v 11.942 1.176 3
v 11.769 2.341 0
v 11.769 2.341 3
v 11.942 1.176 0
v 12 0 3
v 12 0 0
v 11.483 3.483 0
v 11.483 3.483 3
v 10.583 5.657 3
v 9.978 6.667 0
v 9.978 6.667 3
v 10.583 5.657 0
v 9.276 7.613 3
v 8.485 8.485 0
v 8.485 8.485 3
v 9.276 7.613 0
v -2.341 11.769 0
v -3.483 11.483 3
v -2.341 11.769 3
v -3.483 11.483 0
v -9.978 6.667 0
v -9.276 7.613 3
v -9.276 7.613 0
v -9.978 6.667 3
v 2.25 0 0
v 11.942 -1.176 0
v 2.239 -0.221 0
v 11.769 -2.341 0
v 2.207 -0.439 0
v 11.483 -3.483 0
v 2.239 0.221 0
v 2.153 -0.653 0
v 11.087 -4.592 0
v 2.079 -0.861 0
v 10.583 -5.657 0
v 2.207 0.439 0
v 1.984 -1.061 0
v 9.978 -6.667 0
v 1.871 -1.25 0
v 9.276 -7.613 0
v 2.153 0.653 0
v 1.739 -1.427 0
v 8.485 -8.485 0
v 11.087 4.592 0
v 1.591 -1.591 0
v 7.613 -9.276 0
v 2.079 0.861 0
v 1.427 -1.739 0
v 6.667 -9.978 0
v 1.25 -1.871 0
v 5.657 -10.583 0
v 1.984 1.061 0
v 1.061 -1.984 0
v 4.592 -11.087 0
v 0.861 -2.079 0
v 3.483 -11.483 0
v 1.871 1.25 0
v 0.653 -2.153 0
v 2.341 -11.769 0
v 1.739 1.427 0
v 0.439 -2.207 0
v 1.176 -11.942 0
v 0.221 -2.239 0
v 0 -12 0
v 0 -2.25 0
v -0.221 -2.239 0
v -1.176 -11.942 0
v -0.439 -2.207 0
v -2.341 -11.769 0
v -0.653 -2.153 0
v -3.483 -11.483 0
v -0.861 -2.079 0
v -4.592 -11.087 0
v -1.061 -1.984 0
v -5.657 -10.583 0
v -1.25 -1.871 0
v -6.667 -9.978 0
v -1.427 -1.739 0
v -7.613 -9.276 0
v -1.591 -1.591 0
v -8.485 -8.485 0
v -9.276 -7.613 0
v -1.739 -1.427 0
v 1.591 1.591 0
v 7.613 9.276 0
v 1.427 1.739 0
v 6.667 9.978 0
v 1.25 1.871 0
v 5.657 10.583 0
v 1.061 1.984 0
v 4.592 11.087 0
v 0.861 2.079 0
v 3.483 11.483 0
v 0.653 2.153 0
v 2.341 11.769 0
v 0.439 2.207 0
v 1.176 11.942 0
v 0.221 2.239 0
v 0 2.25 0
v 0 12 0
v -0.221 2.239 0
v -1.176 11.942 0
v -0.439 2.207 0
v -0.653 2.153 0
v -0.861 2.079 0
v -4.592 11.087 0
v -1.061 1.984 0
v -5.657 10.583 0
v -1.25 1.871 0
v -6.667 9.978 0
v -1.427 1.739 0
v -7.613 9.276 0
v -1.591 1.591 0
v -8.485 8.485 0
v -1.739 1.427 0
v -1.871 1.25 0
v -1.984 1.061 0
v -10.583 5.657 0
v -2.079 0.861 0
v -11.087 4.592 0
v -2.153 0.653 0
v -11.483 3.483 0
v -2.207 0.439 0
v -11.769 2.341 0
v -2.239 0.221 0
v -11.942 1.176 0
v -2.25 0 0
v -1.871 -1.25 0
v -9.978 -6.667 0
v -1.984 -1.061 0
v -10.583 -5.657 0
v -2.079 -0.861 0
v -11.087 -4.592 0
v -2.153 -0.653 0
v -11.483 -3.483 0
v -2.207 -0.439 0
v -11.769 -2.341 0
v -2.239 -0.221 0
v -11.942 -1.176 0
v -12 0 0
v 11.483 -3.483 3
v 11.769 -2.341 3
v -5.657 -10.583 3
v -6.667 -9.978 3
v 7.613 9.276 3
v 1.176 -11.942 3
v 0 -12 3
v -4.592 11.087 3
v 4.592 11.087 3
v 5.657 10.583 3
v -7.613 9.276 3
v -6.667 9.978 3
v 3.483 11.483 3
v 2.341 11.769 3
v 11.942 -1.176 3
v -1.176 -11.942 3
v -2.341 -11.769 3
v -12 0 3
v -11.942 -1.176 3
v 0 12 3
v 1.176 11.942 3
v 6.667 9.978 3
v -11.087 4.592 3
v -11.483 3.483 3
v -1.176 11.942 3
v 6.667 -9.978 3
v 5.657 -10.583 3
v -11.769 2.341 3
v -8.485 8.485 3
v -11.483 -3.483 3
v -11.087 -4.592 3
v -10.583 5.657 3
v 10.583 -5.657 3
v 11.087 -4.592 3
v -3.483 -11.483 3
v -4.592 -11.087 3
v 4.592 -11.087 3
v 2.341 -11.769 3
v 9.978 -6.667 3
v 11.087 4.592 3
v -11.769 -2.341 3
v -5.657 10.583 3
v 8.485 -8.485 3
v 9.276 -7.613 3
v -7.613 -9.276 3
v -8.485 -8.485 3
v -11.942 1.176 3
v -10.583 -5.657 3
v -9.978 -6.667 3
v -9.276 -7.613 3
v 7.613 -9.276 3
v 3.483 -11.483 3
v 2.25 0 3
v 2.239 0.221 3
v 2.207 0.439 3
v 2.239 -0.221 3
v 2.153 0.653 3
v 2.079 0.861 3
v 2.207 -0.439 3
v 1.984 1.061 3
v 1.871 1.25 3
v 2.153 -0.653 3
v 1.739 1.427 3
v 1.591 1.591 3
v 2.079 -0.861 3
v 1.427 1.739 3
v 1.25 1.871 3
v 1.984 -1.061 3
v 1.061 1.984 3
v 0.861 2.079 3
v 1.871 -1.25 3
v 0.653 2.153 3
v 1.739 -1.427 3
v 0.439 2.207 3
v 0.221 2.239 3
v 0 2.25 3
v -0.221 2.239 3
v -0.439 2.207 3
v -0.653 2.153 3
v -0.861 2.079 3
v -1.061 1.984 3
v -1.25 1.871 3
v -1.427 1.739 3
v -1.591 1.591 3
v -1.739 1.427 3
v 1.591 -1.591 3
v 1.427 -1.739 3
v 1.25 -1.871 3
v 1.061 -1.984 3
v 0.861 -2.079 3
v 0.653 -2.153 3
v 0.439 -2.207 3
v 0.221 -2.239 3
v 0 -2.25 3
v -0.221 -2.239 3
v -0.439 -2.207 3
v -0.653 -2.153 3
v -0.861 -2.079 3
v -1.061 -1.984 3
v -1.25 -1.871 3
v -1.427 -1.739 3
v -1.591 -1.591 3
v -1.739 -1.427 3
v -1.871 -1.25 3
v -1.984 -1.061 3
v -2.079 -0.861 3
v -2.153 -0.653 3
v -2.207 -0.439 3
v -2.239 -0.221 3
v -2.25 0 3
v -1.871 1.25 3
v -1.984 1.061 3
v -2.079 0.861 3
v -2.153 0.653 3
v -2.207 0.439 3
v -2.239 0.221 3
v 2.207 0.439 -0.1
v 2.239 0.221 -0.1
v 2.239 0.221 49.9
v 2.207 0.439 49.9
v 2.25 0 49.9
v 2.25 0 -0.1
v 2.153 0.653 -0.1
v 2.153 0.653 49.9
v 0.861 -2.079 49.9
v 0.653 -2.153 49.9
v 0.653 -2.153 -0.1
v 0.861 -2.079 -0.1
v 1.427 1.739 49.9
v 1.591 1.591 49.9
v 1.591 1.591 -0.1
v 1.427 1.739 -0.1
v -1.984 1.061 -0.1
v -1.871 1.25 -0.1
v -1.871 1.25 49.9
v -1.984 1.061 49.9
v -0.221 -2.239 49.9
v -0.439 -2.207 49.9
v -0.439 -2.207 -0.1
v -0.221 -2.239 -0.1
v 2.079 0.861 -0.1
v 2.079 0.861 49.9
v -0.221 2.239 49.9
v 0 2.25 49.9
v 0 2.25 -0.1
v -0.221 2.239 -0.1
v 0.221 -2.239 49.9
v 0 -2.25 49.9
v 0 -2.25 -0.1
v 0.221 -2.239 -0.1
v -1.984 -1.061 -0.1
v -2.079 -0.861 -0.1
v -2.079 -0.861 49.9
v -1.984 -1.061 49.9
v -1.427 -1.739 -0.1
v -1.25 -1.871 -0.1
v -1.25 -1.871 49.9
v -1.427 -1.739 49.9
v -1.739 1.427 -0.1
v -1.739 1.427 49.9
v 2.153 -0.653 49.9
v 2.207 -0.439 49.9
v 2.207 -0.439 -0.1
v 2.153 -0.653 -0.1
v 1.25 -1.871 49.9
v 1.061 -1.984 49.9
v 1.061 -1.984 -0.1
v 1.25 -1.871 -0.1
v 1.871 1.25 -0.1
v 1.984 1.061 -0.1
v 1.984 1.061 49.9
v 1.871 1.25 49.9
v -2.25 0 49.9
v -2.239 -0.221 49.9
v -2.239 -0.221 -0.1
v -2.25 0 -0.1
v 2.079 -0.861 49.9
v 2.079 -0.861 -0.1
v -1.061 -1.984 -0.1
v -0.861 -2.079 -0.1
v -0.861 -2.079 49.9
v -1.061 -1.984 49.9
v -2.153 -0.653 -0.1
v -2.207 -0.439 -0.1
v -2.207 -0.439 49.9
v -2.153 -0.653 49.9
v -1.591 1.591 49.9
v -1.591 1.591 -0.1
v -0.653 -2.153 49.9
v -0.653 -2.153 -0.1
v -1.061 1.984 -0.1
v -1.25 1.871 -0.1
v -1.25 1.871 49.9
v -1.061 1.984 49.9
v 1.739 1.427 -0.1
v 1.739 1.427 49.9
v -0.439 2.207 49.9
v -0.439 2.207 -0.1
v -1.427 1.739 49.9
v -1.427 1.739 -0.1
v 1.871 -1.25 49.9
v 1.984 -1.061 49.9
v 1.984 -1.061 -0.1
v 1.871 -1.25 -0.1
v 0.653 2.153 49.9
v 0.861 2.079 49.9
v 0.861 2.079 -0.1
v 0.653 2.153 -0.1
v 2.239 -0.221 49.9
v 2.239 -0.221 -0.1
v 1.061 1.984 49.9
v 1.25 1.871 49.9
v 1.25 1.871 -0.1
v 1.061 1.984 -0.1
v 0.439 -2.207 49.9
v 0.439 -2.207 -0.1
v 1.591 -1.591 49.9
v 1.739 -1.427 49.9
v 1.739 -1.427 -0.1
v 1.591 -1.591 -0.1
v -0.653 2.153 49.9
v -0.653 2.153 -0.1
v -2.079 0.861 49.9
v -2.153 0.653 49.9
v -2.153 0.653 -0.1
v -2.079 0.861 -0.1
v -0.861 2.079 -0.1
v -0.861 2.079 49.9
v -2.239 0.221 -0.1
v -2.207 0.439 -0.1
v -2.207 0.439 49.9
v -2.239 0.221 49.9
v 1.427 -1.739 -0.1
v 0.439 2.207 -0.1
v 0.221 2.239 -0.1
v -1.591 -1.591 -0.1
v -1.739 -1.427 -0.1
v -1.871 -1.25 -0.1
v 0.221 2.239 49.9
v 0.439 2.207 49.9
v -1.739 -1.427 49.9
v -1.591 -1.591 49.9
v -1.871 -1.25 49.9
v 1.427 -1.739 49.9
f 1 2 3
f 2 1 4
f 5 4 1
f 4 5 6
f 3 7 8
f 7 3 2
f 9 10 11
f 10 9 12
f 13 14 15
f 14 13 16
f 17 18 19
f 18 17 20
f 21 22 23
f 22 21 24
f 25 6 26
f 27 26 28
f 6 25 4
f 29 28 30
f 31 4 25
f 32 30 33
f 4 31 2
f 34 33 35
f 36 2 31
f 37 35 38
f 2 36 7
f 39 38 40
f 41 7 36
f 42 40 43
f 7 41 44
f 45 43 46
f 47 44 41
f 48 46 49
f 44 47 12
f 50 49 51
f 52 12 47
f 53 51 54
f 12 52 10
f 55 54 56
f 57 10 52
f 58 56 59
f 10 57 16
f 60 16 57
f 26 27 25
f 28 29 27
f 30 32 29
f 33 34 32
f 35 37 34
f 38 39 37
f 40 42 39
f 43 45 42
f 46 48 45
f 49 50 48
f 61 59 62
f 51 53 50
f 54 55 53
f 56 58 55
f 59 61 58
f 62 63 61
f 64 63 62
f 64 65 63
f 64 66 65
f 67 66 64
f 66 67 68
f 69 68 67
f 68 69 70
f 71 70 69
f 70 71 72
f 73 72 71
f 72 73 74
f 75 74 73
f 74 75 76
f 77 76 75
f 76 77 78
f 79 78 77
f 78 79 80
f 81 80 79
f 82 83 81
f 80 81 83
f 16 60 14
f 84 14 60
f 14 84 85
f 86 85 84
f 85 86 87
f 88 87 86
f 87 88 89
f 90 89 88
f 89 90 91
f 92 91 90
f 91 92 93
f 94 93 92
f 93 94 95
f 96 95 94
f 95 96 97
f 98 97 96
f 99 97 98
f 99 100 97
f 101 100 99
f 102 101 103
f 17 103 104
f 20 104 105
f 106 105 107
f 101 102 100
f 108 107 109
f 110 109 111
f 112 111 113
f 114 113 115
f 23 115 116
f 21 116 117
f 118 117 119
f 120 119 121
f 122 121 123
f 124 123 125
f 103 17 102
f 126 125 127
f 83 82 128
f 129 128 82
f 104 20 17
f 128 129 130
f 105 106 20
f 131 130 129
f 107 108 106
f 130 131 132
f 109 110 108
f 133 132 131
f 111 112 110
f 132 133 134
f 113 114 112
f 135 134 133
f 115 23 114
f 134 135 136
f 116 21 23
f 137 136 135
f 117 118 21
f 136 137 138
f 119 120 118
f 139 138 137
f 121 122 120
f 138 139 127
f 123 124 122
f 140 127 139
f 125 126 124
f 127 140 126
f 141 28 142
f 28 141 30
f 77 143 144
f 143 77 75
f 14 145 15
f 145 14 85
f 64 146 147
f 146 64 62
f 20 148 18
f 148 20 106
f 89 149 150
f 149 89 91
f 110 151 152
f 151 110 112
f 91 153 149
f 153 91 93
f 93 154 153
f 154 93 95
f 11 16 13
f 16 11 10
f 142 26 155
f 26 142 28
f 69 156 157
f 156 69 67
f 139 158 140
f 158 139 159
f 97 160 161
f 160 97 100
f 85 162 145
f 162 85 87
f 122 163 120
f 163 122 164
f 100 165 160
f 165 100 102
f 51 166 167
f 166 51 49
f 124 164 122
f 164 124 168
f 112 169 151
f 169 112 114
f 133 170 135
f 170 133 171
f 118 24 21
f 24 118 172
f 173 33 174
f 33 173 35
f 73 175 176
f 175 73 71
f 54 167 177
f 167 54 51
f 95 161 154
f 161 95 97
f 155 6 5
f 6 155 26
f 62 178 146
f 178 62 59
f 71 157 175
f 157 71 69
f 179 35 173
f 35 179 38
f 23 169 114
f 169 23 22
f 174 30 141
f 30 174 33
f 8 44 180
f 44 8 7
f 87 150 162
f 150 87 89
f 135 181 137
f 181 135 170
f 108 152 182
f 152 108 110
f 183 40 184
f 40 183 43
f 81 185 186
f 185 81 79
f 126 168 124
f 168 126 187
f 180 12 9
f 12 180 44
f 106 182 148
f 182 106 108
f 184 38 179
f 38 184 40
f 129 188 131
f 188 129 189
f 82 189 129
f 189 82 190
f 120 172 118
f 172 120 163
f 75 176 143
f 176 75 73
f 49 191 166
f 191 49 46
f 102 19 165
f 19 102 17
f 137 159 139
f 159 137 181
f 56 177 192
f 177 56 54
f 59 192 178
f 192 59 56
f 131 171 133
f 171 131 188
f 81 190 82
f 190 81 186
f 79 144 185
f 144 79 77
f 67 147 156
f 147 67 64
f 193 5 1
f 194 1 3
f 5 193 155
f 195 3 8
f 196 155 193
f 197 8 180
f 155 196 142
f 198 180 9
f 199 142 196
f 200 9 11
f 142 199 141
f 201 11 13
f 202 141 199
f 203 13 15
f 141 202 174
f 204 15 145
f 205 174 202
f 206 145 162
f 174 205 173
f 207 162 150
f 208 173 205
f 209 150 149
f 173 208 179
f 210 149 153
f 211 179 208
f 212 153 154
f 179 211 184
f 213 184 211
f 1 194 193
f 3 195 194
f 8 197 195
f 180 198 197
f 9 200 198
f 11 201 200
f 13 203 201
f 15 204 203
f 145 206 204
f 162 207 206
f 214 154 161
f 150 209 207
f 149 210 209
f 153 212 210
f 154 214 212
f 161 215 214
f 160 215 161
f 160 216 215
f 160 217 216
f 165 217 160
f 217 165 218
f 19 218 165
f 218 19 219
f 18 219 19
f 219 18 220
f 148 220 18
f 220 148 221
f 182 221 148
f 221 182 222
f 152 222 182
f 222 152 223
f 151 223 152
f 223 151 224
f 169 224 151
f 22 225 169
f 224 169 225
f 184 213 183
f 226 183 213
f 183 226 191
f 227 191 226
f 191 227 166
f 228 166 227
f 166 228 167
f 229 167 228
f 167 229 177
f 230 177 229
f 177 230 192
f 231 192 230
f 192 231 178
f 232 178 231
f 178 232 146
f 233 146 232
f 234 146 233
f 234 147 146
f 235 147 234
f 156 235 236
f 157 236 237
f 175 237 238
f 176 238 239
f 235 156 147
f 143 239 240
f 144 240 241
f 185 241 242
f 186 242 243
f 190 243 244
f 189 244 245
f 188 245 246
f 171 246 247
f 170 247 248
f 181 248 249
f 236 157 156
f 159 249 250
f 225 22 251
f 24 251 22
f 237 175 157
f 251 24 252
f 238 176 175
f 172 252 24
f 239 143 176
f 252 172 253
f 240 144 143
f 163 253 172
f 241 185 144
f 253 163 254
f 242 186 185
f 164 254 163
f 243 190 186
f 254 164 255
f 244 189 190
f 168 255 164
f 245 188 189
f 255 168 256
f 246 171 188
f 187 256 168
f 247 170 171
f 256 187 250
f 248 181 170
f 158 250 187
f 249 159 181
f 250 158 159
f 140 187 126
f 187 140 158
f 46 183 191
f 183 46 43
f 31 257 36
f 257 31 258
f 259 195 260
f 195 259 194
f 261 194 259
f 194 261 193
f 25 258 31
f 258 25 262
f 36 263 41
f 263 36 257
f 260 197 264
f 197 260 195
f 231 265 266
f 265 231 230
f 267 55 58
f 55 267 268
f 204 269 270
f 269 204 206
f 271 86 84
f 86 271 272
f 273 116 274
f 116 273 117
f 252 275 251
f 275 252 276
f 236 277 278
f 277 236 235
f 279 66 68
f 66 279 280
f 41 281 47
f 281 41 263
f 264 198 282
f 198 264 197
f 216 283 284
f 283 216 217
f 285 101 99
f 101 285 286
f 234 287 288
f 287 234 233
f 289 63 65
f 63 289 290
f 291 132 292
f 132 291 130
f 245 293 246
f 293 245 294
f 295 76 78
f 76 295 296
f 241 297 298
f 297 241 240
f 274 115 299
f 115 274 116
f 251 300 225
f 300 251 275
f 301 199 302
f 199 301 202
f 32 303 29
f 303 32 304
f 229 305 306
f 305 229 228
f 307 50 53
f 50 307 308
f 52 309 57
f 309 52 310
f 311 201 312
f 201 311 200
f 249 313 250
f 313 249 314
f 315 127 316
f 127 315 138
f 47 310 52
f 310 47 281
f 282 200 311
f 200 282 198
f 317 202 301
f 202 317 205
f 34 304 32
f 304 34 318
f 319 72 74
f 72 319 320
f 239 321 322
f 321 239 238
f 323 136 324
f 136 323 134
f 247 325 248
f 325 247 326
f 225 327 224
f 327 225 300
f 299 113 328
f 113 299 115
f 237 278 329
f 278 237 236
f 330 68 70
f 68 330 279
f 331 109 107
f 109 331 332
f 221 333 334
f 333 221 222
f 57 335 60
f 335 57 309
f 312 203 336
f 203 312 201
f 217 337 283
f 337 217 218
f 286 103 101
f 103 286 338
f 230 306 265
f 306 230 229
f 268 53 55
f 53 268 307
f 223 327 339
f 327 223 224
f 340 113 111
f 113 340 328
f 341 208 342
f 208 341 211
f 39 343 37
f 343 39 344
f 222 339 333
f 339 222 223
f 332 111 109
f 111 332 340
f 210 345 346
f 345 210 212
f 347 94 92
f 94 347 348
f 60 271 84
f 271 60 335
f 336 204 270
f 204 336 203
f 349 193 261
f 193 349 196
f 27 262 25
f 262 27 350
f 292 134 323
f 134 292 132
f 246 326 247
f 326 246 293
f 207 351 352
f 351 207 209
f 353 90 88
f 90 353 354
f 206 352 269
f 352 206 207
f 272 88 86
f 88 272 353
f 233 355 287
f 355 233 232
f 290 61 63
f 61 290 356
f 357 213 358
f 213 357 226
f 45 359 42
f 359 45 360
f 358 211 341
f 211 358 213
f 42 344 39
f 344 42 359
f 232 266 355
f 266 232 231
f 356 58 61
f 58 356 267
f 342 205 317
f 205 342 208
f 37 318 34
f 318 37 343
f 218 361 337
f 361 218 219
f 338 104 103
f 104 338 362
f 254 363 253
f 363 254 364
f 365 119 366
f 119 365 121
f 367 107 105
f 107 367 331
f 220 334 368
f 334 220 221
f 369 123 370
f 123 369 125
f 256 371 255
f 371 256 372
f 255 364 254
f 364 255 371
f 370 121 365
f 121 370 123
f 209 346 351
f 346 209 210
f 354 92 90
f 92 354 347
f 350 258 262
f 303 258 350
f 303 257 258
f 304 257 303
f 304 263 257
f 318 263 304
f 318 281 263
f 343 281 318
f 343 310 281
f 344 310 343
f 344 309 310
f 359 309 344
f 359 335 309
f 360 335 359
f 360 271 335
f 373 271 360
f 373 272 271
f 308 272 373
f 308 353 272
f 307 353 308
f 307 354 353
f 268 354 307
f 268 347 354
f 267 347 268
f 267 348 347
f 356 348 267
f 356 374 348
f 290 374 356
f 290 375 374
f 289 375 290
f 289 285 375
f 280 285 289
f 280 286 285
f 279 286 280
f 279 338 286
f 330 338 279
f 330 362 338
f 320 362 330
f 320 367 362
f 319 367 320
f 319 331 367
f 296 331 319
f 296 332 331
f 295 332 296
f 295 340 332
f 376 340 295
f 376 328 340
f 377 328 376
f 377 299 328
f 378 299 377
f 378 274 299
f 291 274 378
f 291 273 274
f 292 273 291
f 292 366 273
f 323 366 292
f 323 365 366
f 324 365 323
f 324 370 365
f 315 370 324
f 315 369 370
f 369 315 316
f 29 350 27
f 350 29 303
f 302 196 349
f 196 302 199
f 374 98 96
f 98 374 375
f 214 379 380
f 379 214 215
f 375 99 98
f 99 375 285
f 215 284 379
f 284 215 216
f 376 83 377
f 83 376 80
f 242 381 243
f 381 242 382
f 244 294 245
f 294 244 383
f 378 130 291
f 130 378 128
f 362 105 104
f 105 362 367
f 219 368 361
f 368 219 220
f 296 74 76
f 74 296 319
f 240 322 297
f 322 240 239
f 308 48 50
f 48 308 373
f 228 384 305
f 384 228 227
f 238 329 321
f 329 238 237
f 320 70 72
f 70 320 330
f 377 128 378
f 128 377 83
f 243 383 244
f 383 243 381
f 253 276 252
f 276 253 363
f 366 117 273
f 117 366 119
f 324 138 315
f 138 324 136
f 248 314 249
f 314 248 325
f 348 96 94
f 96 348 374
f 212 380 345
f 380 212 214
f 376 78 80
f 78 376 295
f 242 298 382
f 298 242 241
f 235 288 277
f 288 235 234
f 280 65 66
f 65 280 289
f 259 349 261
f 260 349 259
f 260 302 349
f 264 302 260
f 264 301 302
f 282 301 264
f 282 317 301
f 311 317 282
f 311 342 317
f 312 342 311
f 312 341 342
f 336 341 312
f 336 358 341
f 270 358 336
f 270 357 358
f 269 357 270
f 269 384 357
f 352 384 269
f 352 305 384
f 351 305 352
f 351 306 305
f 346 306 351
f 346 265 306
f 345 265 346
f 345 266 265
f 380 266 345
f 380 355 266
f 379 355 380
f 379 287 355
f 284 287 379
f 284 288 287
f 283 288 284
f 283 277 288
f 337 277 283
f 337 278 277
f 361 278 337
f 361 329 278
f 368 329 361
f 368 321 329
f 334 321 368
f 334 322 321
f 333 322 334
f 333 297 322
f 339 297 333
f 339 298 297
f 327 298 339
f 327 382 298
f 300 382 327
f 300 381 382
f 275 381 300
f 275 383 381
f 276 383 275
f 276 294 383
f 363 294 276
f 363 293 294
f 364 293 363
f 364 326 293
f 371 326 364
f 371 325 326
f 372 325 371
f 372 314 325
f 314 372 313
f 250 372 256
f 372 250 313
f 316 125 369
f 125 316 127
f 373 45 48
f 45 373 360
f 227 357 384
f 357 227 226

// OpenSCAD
//CUSTOMIZER VARIABLES



//CUSTOMIZER VARIABLES END



union() {
        union() {
            cylinder(h = 3, r = 12, $fn = 64);
            translate([0,0,-0.1])
            cylinder(h = 50.0, d = 4.5, $fn = 64);

    }
    
    
    
}
